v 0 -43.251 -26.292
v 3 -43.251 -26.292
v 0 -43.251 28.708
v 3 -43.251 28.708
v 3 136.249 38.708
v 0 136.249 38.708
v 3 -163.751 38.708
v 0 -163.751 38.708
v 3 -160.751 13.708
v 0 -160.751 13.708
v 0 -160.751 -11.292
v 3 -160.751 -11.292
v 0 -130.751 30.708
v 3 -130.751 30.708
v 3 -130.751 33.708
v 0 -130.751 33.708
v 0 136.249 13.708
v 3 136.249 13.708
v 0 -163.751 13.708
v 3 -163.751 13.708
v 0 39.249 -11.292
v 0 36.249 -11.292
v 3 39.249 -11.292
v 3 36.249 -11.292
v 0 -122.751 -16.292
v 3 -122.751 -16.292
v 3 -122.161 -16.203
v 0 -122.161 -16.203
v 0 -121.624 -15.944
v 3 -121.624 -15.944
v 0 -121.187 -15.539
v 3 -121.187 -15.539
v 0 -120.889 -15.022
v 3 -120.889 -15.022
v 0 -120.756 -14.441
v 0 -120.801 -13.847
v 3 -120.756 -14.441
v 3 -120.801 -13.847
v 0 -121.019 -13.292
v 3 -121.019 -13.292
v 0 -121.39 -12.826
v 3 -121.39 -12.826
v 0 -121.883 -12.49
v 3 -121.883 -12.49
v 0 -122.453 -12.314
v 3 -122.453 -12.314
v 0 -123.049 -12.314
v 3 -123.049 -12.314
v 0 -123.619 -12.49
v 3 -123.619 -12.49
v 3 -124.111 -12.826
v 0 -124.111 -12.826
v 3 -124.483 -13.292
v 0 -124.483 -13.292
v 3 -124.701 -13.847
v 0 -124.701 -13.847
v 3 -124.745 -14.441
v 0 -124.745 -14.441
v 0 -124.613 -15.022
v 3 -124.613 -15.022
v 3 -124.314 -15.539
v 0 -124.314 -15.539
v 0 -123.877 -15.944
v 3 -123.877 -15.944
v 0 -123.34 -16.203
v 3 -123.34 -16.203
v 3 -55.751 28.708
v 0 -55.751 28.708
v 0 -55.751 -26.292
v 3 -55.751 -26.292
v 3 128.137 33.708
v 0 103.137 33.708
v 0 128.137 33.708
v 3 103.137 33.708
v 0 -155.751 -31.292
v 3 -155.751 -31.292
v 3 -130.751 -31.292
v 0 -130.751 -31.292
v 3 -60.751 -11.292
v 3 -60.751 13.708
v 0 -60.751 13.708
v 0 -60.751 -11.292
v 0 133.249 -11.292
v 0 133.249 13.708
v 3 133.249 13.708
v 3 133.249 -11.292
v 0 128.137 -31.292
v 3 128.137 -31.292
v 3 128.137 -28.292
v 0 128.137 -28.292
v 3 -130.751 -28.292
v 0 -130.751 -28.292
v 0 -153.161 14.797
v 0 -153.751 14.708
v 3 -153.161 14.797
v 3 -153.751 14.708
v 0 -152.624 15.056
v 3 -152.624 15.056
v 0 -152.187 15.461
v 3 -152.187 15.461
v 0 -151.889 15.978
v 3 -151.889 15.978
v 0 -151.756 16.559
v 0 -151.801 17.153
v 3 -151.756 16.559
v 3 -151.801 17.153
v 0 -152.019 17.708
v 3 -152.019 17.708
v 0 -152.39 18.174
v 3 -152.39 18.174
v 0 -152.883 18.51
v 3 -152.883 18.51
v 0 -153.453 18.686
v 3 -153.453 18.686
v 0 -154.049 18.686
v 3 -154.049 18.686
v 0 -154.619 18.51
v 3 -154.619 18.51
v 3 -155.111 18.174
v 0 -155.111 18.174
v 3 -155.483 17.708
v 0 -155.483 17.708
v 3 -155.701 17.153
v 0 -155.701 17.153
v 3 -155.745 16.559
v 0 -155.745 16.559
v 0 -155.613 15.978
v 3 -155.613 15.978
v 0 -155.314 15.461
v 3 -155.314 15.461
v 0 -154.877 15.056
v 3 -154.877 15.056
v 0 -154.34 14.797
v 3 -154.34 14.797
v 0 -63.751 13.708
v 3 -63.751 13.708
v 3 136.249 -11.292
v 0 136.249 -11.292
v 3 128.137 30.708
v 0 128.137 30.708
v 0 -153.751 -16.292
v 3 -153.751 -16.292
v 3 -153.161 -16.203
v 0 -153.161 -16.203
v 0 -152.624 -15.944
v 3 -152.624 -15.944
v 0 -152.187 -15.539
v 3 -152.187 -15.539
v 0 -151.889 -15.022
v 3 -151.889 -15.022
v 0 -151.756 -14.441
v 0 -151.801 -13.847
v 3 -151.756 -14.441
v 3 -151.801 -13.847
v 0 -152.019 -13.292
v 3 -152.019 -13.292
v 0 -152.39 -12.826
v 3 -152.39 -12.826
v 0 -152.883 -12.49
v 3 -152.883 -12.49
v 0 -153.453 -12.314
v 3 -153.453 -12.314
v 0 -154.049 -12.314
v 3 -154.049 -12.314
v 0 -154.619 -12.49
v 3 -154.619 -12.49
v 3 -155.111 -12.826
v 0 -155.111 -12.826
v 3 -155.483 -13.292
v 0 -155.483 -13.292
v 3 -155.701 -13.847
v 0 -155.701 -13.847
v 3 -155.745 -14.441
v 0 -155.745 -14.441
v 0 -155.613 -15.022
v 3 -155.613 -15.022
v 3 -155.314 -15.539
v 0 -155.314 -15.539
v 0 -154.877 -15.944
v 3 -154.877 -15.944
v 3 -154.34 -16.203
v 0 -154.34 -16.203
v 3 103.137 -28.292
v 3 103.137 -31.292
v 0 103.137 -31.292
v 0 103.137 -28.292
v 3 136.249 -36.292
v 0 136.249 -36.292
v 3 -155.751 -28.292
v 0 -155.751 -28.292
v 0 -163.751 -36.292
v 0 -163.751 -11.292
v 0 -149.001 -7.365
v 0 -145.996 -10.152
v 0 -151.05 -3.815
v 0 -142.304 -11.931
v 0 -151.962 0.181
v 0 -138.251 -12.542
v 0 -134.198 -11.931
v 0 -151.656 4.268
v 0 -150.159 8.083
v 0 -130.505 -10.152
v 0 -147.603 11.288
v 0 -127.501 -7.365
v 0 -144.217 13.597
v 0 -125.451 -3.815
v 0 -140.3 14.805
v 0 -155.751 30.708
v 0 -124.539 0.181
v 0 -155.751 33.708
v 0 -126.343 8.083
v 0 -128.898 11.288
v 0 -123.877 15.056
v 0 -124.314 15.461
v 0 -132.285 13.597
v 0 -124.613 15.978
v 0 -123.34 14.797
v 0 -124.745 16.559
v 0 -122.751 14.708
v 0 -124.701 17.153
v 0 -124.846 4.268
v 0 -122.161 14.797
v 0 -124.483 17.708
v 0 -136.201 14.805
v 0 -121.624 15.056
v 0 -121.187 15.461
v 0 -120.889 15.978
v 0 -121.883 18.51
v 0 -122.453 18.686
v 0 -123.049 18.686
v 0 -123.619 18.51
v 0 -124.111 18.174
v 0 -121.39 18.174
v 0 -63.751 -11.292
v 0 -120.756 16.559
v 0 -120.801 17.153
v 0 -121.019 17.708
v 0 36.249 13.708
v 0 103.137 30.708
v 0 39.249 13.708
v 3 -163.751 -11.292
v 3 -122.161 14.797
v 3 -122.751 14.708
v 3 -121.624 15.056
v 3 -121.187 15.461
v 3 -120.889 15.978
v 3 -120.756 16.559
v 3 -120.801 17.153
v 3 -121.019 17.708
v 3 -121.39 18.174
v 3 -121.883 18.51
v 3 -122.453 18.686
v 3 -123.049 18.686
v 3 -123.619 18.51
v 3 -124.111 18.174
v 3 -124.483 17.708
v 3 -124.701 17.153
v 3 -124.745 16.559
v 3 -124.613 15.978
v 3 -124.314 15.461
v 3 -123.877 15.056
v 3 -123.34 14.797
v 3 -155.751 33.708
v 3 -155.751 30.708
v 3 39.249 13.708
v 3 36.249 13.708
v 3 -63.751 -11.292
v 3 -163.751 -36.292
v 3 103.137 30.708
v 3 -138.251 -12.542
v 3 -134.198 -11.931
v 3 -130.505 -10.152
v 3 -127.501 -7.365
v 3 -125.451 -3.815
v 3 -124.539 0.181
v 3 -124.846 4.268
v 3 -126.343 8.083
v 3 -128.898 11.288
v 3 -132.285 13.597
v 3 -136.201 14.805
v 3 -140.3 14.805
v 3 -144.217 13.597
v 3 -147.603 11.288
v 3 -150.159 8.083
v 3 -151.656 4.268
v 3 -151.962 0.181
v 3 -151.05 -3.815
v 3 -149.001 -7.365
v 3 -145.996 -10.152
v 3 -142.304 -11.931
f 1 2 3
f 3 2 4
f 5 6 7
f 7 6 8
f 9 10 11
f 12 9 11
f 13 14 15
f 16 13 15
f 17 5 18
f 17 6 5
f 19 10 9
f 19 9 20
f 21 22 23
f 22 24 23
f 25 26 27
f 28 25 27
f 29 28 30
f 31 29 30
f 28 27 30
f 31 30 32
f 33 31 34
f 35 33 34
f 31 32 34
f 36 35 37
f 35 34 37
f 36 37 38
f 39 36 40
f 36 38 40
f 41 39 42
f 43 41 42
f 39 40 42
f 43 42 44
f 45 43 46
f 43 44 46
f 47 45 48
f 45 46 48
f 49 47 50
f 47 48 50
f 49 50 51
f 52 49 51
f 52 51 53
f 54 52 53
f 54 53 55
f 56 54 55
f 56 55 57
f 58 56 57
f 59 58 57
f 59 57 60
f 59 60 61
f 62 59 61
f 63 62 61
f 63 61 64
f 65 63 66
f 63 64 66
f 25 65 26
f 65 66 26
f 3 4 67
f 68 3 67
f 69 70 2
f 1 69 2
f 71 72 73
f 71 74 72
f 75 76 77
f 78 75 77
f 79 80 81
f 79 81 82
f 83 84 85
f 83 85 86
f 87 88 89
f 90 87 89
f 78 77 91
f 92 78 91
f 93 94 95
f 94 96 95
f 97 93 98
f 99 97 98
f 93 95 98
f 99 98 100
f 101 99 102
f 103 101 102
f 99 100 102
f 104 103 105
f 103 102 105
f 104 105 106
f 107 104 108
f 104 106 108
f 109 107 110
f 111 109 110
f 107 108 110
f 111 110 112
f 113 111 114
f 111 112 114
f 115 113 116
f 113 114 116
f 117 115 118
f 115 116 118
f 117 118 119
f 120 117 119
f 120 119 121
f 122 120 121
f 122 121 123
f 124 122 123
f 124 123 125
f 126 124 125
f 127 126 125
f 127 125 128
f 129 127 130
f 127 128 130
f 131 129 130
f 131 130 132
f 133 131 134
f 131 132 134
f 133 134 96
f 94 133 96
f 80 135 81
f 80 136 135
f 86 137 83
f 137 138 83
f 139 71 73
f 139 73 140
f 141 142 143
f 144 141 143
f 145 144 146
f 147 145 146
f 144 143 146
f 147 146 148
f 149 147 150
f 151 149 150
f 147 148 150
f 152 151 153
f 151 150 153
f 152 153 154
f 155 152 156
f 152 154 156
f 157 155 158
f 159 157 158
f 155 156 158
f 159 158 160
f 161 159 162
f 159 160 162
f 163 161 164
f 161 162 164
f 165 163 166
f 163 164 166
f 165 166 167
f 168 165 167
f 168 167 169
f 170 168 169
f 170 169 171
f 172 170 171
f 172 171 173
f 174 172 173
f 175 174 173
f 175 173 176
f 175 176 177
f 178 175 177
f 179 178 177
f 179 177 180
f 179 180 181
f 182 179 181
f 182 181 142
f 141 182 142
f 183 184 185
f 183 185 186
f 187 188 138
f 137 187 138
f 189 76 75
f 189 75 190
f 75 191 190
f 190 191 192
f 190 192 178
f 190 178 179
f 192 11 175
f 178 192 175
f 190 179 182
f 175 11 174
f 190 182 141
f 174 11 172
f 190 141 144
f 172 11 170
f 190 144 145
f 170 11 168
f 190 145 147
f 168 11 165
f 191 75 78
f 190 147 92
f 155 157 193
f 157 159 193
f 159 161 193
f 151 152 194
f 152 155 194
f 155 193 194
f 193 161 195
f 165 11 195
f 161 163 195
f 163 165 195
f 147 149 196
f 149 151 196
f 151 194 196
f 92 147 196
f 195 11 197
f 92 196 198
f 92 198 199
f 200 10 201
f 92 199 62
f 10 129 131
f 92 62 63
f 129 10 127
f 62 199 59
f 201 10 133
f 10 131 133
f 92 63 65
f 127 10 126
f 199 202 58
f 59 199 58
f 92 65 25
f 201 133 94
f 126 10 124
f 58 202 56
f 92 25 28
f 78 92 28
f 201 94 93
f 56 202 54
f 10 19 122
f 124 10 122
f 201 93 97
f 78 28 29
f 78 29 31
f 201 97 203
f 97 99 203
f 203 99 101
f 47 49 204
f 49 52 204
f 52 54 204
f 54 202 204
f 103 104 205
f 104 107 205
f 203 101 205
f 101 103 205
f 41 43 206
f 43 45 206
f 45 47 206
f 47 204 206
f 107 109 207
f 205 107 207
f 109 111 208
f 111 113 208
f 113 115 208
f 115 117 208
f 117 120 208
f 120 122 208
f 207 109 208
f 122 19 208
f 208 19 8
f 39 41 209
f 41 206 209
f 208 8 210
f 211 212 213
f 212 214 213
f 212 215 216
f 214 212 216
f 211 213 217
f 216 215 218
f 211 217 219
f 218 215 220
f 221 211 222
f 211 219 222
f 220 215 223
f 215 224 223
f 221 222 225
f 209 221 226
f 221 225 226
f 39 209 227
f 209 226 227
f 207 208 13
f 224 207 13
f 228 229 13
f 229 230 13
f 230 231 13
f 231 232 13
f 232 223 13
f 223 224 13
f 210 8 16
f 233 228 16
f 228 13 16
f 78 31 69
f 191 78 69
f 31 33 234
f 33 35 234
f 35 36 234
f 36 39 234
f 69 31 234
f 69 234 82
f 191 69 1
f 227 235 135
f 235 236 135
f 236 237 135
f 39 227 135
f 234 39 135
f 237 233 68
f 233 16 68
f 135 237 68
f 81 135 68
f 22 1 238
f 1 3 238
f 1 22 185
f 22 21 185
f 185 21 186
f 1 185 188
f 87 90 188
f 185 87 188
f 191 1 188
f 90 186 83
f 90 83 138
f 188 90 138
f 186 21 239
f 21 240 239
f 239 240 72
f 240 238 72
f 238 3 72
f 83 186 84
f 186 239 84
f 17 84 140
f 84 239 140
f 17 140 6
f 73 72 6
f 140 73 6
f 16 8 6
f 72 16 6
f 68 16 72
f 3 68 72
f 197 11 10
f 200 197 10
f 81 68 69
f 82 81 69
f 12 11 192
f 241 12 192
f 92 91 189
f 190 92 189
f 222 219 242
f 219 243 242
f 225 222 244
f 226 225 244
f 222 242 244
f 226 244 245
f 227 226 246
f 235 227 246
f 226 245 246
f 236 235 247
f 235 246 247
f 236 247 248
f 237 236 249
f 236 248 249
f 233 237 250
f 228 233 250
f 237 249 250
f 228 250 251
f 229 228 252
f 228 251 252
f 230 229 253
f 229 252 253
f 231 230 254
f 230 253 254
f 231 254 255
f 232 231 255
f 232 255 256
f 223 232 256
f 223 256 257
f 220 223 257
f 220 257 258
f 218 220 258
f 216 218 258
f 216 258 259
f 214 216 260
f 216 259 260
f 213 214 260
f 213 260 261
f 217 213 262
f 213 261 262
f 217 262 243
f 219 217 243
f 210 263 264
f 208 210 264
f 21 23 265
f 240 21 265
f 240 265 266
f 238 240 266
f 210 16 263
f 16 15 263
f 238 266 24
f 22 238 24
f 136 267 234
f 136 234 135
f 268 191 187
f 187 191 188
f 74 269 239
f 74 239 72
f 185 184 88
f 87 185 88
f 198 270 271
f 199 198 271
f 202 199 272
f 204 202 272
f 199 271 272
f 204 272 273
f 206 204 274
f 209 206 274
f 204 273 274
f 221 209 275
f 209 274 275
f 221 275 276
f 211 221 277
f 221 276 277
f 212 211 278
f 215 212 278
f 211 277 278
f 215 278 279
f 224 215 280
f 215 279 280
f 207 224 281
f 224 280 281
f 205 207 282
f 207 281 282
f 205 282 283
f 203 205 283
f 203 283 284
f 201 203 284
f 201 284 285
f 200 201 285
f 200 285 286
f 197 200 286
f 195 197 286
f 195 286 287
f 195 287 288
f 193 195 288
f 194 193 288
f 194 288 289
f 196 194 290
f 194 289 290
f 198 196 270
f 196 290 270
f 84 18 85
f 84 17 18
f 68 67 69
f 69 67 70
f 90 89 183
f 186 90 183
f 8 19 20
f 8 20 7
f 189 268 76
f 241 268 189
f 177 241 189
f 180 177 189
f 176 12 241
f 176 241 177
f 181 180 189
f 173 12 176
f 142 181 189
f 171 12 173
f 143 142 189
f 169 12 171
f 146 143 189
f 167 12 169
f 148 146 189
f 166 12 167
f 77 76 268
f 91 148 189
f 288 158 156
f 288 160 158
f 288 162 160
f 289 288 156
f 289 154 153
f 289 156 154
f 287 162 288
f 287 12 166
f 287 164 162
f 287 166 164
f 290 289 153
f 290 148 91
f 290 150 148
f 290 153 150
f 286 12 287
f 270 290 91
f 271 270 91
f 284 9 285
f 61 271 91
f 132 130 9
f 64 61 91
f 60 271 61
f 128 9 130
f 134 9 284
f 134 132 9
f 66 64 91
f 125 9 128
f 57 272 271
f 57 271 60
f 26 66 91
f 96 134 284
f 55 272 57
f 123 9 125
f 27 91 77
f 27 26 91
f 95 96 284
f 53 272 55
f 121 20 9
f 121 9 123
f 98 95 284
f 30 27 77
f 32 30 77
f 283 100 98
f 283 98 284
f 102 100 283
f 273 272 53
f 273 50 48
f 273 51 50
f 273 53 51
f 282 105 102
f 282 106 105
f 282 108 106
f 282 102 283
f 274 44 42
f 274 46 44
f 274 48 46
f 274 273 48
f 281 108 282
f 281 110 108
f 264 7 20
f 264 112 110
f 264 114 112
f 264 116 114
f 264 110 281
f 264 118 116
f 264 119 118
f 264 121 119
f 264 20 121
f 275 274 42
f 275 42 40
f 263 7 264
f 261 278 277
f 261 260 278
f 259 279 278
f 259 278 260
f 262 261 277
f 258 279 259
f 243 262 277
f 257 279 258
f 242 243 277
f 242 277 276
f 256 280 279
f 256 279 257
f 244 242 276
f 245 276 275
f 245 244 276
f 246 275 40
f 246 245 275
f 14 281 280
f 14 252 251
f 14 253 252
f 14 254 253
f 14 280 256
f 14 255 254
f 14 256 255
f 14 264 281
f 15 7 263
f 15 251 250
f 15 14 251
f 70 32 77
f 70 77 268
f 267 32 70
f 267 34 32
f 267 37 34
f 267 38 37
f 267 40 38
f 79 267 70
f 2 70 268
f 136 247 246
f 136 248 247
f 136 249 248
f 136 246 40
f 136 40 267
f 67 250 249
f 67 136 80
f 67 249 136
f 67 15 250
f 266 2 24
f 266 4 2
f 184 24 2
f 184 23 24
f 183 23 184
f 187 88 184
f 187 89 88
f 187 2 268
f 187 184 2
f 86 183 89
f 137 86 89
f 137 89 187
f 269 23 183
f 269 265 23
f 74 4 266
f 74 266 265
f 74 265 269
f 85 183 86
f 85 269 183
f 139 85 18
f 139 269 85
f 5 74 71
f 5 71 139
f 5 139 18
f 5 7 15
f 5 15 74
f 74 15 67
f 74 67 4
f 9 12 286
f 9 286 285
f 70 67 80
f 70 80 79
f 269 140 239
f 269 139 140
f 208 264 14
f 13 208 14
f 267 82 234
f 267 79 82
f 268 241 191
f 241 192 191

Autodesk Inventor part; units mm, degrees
ref_plane "YZ Plane" through (0, 0, 0) normal (1, 0, 0) x (0, 1, 0)
ref_plane "XZ Plane" through (0, 0, 0) normal (0, 1, 0) x (-1, 0, 0)
ref_plane "XY Plane" through (0, 0, 0) normal (0, 0, 1) x (1, 0, 0)
sketch "Sketch1" plane through (0, 0, 0) normal (1, 0, 0) x (0, 1, 0)
  line L0 (136.2492, 38.7083) -> (-163.7508, 38.7083)
  line L1 (-163.7508, -36.2917) -> (136.2492, -36.2917)
  line L2 (-160.7508, 13.7083) -> (-160.7508, -11.2917)
  line L3 (-160.7508, -11.2917) -> (-163.7508, -11.2917)
  line L4 (-160.7508, 13.7083) -> (-163.7508, 13.7083)
  line L5 (-163.7508, 13.7083) -> (-163.7508, 38.7083)
  line L6 (-163.7508, -11.2917) -> (-163.7508, -36.2917)
  line L7 (136.2492, 38.7083) -> (136.2492, 13.7083)
  line L8 (136.2492, -36.2917) -> (136.2492, -11.2917)
  line L9 (136.2492, 13.7083) -> (133.2492, 13.7083)
  line L10 (133.2492, 13.7083) -> (133.2492, -11.2917)
  line L11 (136.2492, -11.2917) -> (133.2492, -11.2917)
  point P0 (0, 0)
  dimension "d1" = 300
extrude "Extrusion1" add sketch "Sketch1" along normal blind 3
sketch "Sketch2" plane through (3, 0, 0) normal (1, 0, 0) x (0, 0, -1)
  line L0 (-13.7083, -163.7508) -> (-13.7083, -160.7508) projected
  line L1 (-13.7083, -160.7508) -> (11.2917, -160.7508) projected
  line L2 (-13.7083, -60.7508) -> (11.2917, -60.7508)
  line L3 (11.2917, -60.7508) -> (11.2917, -63.7508)
  line L4 (11.2917, -63.7508) -> (-13.7083, -63.7508)
  line L5 (-13.7083, -63.7508) -> (-13.7083, -60.7508)
  line L6 (36.2917, -163.7508) -> (36.2917, 136.2492) projected
  line L7 (-13.7083, 36.2492) -> (11.2917, 36.2492)
  line L8 (11.2917, 36.2492) -> (11.2917, 39.2492)
  line L9 (11.2917, 39.2492) -> (-13.7083, 39.2492)
  line L10 (-13.7083, 39.2492) -> (-13.7083, 36.2492)
  point P0 (0, 0)
extrude "Extrusion2" cut sketch "Sketch2" against normal blind 3
sketch "Sketch3" plane through (3, 0, 0) normal (1, 0, 0) x (0, 0, -1)
  line L0 (-13.7083, -160.7508) -> (11.2917, -160.7508) projected
  circle A0 centre (-16.7083, -154.7508) radius 1.5
  circle A1 centre (14.2917, -154.7508) radius 1.5
  circle A2 centre (14.2917, -123.7508) radius 1.5
  circle A3 centre (-16.7083, -123.7508) radius 1.5
  circle A4 centre (-1.2083, -139.2508) radius 12
  point P0 (0, 0)
  dimension "d29" = 3
  dimension "d30" = 3
  dimension "d31" = 3
  dimension "d32" = 3
  dimension "d33" = 24
extrude "Extrusion3" cut sketch "Sketch3" against normal blind 3
sketch "Sketch4" plane through (3, 0, 0) normal (1, 0, 0) x (0, 0, -1)
  line L0 (-13.7083, -160.7508) -> (11.2917, -160.7508) projected
  line L1 (36.2917, -163.7508) -> (36.2917, 136.2492) projected
  line L2 (31.2917, -155.7508) -> (28.2917, -155.7508)
  line L3 (28.2917, -155.7508) -> (28.2917, -145.7508)
  line L4 (28.2917, -145.7508) -> (31.2917, -145.7508)
  line L5 (31.2917, -145.7508) -> (31.2917, -155.7508)
  line L6 (-38.7083, 136.2492) -> (-38.7083, -163.7508) projected
  line L7 (-33.7083, -155.7508) -> (-30.7083, -155.7508)
  line L8 (-30.7083, -155.7508) -> (-30.7083, -145.7508)
  line L9 (-30.7083, -145.7508) -> (-33.7083, -145.7508)
  line L10 (-33.7083, -145.7508) -> (-33.7083, -155.7508)
  line L11 (-33.7083, 128.1373) -> (-30.7083, 128.1373)
  line L12 (-30.7083, 128.1373) -> (-30.7083, 118.1373)
  line L13 (-30.7083, 118.1373) -> (-33.7083, 118.1373)
  line L14 (-33.7083, 118.1373) -> (-33.7083, 128.1373)
  line L15 (31.2917, 128.1373) -> (28.2917, 128.1373)
  line L16 (28.2917, 128.1373) -> (28.2917, 118.1373)
  line L17 (28.2917, 118.1373) -> (31.2917, 118.1373)
  line L18 (31.2917, 118.1373) -> (31.2917, 128.1373)
  point P0 (0, 0)
  dimension "d38" = 3
  dimension "d39" = 10
  dimension "d46" = 3
  dimension "d47" = 10
  dimension "d48" = 3
  dimension "d49" = 10
  dimension "d50" = 10
  dimension "d51" = 3
extrude "Extrusion4" cut sketch "Sketch4" against normal blind 30
sketch "Sketch5" plane through (3, 0, 0) normal (1, 0, 0) x (0, 0, -1)
  line L0 (-13.7083, -60.7508) -> (11.2917, -60.7508) projected
  line L1 (-38.7083, 136.2492) -> (-38.7083, -163.7508) projected
  line L2 (36.2917, -163.7508) -> (36.2917, 136.2492) projected
  line L3 (-28.7083, -55.7508) -> (26.2917, -55.7508)
  line L4 (26.2917, -55.7508) -> (26.2917, -43.2508)
  line L5 (26.2917, -43.2508) -> (-28.7083, -43.2508)
  line L6 (-28.7083, -43.2508) -> (-28.7083, -55.7508)
  point P0 (0, 0)
extrude "Extrusion5" cut sketch "Sketch5" against normal blind 10
sketch "Sketch6" plane through (3, 0, 0) normal (1, 0, 0) x (0, 0, -1)
  line L0 (-30.7083, 118.1373) -> (-33.7083, 118.1373) projected
  line L1 (-33.7083, 118.1373) -> (-30.7083, 118.1373)
  line L2 (-30.7083, 118.1373) -> (-30.7083, 103.1373)
  line L3 (-30.7083, 103.1373) -> (-33.7083, 103.1373)
  line L4 (-33.7083, 103.1373) -> (-33.7083, 118.1373)
  line L5 (28.2917, 118.1373) -> (31.2917, 118.1373) projected
  line L6 (28.2917, 118.1373) -> (31.2917, 118.1373)
  line L7 (31.2917, 118.1373) -> (31.2917, 103.1373)
  line L8 (31.2917, 103.1373) -> (28.2917, 103.1373)
  line L9 (28.2917, 103.1373) -> (28.2917, 118.1373)
  line L10 (-33.7083, -155.7508) -> (-33.7083, -145.7508) projected
  line L11 (-33.7083, -145.7508) -> (-30.7083, -145.7508)
  line L12 (-30.7083, -145.7508) -> (-30.7083, -130.7508)
  line L13 (-30.7083, -130.7508) -> (-33.7083, -130.7508)
  line L14 (-33.7083, -130.7508) -> (-33.7083, -145.7508)
  line L15 (28.2917, -155.7508) -> (28.2917, -145.7508) projected
  line L16 (28.2917, -145.7508) -> (31.2917, -145.7508)
  line L17 (31.2917, -145.7508) -> (31.2917, -130.7508)
  line L18 (31.2917, -130.7508) -> (28.2917, -130.7508)
  line L19 (28.2917, -130.7508) -> (28.2917, -145.7508)
  point P0 (0, 0)
  dimension "d62" = 15
  dimension "d63" = 15
extrude "Extrusion6" cut sketch "Sketch6" against normal blind 10
sketch "Sketch7" plane through (3, 0, 0) normal (1, 0, 0) x (0, 0, -1)
  point P0 (0, 0)
sketch "Sketch8" plane through (3, 0, 0) normal (1, 0, 0) x (0, 0, -1)
  circle A0 centre (-16.7083, -123.7508) radius 1.5 projected
  circle A1 centre (14.2917, -123.7508) radius 1.5 projected
  line L0 (-16.7083, -123.7508) -> (14.2917, -123.7508)
  circle A2 centre (14.2917, -154.7508) radius 1.5 projected
  line L1 (14.2917, -123.7508) -> (14.2917, -154.7508)
  circle A3 centre (-16.7083, -154.7508) radius 1.5 projected
  line L2 (14.2917, -154.7508) -> (-16.7083, -154.7508)
  line L3 (-16.7083, -154.7508) -> (-16.7083, -123.7508)
  circle A4 centre (-16.7083, -123.7508) radius 1.5
  circle A5 centre (14.2917, -123.7508) radius 1.5
  circle A6 centre (14.2917, -154.7508) radius 1.5
  circle A7 centre (-16.7083, -154.7508) radius 1.5
  circle A8 centre (-1.2083, -139.2508) radius 12 projected
  circle A9 centre (-1.2083, -139.2508) radius 12
  point P0 (0, 0)
extrude "Extrusion7" add sketch "Sketch8" against normal blind 3 contours L0 L3 A0 | A0 L3 L0 | L0 L1 A1 | A1 L1 L0 | L3 L2 A3 | A3 L2 L3 | L1 L2 A2 | A2 L2 L1 | A8
sketch "Sketch9" plane through (3, 0, 0) normal (1, 0, 0) x (0, 0, -1)
  line L0 (11.2917, -163.7508) -> (36.2917, -163.7508) projected
  line L1 (-38.7083, -163.7508) -> (-13.7083, -163.7508) projected
  line L2 (36.2917, -163.7508) -> (36.2917, 136.2492) projected
  circle A0 centre (-16.7083, -153.7508) radius 2
  circle A1 centre (14.2917, -153.7508) radius 2
  circle A2 centre (14.2917, -122.7508) radius 2
  circle A3 centre (-16.7083, -122.7508) radius 2
  circle A4 centre (-1.2083, -138.2508) radius 12
  point P0 (0, 0)
  dimension "d75" = 4
  dimension "d76" = 4
  dimension "d77" = 4
  dimension "d78" = 4
  dimension "d79" = 24
extrude "Extrusion8" cut sketch "Sketch9" against normal blind 3
sketch "Sketch10" plane through (3, 0, 0) normal (1, 0, 0) x (0, 0, -1)
  circle A0 centre (-1.2083, -138.2508) radius 12 projected
  circle A1 centre (-1.2083, -138.2508) radius 13.75
  point P0 (0, 0)
  dimension "d82" = 27.5
extrude "Extrusion9" cut sketch "Sketch10" against normal blind 10 contours A0 | A1
properties part number "MuurL"
